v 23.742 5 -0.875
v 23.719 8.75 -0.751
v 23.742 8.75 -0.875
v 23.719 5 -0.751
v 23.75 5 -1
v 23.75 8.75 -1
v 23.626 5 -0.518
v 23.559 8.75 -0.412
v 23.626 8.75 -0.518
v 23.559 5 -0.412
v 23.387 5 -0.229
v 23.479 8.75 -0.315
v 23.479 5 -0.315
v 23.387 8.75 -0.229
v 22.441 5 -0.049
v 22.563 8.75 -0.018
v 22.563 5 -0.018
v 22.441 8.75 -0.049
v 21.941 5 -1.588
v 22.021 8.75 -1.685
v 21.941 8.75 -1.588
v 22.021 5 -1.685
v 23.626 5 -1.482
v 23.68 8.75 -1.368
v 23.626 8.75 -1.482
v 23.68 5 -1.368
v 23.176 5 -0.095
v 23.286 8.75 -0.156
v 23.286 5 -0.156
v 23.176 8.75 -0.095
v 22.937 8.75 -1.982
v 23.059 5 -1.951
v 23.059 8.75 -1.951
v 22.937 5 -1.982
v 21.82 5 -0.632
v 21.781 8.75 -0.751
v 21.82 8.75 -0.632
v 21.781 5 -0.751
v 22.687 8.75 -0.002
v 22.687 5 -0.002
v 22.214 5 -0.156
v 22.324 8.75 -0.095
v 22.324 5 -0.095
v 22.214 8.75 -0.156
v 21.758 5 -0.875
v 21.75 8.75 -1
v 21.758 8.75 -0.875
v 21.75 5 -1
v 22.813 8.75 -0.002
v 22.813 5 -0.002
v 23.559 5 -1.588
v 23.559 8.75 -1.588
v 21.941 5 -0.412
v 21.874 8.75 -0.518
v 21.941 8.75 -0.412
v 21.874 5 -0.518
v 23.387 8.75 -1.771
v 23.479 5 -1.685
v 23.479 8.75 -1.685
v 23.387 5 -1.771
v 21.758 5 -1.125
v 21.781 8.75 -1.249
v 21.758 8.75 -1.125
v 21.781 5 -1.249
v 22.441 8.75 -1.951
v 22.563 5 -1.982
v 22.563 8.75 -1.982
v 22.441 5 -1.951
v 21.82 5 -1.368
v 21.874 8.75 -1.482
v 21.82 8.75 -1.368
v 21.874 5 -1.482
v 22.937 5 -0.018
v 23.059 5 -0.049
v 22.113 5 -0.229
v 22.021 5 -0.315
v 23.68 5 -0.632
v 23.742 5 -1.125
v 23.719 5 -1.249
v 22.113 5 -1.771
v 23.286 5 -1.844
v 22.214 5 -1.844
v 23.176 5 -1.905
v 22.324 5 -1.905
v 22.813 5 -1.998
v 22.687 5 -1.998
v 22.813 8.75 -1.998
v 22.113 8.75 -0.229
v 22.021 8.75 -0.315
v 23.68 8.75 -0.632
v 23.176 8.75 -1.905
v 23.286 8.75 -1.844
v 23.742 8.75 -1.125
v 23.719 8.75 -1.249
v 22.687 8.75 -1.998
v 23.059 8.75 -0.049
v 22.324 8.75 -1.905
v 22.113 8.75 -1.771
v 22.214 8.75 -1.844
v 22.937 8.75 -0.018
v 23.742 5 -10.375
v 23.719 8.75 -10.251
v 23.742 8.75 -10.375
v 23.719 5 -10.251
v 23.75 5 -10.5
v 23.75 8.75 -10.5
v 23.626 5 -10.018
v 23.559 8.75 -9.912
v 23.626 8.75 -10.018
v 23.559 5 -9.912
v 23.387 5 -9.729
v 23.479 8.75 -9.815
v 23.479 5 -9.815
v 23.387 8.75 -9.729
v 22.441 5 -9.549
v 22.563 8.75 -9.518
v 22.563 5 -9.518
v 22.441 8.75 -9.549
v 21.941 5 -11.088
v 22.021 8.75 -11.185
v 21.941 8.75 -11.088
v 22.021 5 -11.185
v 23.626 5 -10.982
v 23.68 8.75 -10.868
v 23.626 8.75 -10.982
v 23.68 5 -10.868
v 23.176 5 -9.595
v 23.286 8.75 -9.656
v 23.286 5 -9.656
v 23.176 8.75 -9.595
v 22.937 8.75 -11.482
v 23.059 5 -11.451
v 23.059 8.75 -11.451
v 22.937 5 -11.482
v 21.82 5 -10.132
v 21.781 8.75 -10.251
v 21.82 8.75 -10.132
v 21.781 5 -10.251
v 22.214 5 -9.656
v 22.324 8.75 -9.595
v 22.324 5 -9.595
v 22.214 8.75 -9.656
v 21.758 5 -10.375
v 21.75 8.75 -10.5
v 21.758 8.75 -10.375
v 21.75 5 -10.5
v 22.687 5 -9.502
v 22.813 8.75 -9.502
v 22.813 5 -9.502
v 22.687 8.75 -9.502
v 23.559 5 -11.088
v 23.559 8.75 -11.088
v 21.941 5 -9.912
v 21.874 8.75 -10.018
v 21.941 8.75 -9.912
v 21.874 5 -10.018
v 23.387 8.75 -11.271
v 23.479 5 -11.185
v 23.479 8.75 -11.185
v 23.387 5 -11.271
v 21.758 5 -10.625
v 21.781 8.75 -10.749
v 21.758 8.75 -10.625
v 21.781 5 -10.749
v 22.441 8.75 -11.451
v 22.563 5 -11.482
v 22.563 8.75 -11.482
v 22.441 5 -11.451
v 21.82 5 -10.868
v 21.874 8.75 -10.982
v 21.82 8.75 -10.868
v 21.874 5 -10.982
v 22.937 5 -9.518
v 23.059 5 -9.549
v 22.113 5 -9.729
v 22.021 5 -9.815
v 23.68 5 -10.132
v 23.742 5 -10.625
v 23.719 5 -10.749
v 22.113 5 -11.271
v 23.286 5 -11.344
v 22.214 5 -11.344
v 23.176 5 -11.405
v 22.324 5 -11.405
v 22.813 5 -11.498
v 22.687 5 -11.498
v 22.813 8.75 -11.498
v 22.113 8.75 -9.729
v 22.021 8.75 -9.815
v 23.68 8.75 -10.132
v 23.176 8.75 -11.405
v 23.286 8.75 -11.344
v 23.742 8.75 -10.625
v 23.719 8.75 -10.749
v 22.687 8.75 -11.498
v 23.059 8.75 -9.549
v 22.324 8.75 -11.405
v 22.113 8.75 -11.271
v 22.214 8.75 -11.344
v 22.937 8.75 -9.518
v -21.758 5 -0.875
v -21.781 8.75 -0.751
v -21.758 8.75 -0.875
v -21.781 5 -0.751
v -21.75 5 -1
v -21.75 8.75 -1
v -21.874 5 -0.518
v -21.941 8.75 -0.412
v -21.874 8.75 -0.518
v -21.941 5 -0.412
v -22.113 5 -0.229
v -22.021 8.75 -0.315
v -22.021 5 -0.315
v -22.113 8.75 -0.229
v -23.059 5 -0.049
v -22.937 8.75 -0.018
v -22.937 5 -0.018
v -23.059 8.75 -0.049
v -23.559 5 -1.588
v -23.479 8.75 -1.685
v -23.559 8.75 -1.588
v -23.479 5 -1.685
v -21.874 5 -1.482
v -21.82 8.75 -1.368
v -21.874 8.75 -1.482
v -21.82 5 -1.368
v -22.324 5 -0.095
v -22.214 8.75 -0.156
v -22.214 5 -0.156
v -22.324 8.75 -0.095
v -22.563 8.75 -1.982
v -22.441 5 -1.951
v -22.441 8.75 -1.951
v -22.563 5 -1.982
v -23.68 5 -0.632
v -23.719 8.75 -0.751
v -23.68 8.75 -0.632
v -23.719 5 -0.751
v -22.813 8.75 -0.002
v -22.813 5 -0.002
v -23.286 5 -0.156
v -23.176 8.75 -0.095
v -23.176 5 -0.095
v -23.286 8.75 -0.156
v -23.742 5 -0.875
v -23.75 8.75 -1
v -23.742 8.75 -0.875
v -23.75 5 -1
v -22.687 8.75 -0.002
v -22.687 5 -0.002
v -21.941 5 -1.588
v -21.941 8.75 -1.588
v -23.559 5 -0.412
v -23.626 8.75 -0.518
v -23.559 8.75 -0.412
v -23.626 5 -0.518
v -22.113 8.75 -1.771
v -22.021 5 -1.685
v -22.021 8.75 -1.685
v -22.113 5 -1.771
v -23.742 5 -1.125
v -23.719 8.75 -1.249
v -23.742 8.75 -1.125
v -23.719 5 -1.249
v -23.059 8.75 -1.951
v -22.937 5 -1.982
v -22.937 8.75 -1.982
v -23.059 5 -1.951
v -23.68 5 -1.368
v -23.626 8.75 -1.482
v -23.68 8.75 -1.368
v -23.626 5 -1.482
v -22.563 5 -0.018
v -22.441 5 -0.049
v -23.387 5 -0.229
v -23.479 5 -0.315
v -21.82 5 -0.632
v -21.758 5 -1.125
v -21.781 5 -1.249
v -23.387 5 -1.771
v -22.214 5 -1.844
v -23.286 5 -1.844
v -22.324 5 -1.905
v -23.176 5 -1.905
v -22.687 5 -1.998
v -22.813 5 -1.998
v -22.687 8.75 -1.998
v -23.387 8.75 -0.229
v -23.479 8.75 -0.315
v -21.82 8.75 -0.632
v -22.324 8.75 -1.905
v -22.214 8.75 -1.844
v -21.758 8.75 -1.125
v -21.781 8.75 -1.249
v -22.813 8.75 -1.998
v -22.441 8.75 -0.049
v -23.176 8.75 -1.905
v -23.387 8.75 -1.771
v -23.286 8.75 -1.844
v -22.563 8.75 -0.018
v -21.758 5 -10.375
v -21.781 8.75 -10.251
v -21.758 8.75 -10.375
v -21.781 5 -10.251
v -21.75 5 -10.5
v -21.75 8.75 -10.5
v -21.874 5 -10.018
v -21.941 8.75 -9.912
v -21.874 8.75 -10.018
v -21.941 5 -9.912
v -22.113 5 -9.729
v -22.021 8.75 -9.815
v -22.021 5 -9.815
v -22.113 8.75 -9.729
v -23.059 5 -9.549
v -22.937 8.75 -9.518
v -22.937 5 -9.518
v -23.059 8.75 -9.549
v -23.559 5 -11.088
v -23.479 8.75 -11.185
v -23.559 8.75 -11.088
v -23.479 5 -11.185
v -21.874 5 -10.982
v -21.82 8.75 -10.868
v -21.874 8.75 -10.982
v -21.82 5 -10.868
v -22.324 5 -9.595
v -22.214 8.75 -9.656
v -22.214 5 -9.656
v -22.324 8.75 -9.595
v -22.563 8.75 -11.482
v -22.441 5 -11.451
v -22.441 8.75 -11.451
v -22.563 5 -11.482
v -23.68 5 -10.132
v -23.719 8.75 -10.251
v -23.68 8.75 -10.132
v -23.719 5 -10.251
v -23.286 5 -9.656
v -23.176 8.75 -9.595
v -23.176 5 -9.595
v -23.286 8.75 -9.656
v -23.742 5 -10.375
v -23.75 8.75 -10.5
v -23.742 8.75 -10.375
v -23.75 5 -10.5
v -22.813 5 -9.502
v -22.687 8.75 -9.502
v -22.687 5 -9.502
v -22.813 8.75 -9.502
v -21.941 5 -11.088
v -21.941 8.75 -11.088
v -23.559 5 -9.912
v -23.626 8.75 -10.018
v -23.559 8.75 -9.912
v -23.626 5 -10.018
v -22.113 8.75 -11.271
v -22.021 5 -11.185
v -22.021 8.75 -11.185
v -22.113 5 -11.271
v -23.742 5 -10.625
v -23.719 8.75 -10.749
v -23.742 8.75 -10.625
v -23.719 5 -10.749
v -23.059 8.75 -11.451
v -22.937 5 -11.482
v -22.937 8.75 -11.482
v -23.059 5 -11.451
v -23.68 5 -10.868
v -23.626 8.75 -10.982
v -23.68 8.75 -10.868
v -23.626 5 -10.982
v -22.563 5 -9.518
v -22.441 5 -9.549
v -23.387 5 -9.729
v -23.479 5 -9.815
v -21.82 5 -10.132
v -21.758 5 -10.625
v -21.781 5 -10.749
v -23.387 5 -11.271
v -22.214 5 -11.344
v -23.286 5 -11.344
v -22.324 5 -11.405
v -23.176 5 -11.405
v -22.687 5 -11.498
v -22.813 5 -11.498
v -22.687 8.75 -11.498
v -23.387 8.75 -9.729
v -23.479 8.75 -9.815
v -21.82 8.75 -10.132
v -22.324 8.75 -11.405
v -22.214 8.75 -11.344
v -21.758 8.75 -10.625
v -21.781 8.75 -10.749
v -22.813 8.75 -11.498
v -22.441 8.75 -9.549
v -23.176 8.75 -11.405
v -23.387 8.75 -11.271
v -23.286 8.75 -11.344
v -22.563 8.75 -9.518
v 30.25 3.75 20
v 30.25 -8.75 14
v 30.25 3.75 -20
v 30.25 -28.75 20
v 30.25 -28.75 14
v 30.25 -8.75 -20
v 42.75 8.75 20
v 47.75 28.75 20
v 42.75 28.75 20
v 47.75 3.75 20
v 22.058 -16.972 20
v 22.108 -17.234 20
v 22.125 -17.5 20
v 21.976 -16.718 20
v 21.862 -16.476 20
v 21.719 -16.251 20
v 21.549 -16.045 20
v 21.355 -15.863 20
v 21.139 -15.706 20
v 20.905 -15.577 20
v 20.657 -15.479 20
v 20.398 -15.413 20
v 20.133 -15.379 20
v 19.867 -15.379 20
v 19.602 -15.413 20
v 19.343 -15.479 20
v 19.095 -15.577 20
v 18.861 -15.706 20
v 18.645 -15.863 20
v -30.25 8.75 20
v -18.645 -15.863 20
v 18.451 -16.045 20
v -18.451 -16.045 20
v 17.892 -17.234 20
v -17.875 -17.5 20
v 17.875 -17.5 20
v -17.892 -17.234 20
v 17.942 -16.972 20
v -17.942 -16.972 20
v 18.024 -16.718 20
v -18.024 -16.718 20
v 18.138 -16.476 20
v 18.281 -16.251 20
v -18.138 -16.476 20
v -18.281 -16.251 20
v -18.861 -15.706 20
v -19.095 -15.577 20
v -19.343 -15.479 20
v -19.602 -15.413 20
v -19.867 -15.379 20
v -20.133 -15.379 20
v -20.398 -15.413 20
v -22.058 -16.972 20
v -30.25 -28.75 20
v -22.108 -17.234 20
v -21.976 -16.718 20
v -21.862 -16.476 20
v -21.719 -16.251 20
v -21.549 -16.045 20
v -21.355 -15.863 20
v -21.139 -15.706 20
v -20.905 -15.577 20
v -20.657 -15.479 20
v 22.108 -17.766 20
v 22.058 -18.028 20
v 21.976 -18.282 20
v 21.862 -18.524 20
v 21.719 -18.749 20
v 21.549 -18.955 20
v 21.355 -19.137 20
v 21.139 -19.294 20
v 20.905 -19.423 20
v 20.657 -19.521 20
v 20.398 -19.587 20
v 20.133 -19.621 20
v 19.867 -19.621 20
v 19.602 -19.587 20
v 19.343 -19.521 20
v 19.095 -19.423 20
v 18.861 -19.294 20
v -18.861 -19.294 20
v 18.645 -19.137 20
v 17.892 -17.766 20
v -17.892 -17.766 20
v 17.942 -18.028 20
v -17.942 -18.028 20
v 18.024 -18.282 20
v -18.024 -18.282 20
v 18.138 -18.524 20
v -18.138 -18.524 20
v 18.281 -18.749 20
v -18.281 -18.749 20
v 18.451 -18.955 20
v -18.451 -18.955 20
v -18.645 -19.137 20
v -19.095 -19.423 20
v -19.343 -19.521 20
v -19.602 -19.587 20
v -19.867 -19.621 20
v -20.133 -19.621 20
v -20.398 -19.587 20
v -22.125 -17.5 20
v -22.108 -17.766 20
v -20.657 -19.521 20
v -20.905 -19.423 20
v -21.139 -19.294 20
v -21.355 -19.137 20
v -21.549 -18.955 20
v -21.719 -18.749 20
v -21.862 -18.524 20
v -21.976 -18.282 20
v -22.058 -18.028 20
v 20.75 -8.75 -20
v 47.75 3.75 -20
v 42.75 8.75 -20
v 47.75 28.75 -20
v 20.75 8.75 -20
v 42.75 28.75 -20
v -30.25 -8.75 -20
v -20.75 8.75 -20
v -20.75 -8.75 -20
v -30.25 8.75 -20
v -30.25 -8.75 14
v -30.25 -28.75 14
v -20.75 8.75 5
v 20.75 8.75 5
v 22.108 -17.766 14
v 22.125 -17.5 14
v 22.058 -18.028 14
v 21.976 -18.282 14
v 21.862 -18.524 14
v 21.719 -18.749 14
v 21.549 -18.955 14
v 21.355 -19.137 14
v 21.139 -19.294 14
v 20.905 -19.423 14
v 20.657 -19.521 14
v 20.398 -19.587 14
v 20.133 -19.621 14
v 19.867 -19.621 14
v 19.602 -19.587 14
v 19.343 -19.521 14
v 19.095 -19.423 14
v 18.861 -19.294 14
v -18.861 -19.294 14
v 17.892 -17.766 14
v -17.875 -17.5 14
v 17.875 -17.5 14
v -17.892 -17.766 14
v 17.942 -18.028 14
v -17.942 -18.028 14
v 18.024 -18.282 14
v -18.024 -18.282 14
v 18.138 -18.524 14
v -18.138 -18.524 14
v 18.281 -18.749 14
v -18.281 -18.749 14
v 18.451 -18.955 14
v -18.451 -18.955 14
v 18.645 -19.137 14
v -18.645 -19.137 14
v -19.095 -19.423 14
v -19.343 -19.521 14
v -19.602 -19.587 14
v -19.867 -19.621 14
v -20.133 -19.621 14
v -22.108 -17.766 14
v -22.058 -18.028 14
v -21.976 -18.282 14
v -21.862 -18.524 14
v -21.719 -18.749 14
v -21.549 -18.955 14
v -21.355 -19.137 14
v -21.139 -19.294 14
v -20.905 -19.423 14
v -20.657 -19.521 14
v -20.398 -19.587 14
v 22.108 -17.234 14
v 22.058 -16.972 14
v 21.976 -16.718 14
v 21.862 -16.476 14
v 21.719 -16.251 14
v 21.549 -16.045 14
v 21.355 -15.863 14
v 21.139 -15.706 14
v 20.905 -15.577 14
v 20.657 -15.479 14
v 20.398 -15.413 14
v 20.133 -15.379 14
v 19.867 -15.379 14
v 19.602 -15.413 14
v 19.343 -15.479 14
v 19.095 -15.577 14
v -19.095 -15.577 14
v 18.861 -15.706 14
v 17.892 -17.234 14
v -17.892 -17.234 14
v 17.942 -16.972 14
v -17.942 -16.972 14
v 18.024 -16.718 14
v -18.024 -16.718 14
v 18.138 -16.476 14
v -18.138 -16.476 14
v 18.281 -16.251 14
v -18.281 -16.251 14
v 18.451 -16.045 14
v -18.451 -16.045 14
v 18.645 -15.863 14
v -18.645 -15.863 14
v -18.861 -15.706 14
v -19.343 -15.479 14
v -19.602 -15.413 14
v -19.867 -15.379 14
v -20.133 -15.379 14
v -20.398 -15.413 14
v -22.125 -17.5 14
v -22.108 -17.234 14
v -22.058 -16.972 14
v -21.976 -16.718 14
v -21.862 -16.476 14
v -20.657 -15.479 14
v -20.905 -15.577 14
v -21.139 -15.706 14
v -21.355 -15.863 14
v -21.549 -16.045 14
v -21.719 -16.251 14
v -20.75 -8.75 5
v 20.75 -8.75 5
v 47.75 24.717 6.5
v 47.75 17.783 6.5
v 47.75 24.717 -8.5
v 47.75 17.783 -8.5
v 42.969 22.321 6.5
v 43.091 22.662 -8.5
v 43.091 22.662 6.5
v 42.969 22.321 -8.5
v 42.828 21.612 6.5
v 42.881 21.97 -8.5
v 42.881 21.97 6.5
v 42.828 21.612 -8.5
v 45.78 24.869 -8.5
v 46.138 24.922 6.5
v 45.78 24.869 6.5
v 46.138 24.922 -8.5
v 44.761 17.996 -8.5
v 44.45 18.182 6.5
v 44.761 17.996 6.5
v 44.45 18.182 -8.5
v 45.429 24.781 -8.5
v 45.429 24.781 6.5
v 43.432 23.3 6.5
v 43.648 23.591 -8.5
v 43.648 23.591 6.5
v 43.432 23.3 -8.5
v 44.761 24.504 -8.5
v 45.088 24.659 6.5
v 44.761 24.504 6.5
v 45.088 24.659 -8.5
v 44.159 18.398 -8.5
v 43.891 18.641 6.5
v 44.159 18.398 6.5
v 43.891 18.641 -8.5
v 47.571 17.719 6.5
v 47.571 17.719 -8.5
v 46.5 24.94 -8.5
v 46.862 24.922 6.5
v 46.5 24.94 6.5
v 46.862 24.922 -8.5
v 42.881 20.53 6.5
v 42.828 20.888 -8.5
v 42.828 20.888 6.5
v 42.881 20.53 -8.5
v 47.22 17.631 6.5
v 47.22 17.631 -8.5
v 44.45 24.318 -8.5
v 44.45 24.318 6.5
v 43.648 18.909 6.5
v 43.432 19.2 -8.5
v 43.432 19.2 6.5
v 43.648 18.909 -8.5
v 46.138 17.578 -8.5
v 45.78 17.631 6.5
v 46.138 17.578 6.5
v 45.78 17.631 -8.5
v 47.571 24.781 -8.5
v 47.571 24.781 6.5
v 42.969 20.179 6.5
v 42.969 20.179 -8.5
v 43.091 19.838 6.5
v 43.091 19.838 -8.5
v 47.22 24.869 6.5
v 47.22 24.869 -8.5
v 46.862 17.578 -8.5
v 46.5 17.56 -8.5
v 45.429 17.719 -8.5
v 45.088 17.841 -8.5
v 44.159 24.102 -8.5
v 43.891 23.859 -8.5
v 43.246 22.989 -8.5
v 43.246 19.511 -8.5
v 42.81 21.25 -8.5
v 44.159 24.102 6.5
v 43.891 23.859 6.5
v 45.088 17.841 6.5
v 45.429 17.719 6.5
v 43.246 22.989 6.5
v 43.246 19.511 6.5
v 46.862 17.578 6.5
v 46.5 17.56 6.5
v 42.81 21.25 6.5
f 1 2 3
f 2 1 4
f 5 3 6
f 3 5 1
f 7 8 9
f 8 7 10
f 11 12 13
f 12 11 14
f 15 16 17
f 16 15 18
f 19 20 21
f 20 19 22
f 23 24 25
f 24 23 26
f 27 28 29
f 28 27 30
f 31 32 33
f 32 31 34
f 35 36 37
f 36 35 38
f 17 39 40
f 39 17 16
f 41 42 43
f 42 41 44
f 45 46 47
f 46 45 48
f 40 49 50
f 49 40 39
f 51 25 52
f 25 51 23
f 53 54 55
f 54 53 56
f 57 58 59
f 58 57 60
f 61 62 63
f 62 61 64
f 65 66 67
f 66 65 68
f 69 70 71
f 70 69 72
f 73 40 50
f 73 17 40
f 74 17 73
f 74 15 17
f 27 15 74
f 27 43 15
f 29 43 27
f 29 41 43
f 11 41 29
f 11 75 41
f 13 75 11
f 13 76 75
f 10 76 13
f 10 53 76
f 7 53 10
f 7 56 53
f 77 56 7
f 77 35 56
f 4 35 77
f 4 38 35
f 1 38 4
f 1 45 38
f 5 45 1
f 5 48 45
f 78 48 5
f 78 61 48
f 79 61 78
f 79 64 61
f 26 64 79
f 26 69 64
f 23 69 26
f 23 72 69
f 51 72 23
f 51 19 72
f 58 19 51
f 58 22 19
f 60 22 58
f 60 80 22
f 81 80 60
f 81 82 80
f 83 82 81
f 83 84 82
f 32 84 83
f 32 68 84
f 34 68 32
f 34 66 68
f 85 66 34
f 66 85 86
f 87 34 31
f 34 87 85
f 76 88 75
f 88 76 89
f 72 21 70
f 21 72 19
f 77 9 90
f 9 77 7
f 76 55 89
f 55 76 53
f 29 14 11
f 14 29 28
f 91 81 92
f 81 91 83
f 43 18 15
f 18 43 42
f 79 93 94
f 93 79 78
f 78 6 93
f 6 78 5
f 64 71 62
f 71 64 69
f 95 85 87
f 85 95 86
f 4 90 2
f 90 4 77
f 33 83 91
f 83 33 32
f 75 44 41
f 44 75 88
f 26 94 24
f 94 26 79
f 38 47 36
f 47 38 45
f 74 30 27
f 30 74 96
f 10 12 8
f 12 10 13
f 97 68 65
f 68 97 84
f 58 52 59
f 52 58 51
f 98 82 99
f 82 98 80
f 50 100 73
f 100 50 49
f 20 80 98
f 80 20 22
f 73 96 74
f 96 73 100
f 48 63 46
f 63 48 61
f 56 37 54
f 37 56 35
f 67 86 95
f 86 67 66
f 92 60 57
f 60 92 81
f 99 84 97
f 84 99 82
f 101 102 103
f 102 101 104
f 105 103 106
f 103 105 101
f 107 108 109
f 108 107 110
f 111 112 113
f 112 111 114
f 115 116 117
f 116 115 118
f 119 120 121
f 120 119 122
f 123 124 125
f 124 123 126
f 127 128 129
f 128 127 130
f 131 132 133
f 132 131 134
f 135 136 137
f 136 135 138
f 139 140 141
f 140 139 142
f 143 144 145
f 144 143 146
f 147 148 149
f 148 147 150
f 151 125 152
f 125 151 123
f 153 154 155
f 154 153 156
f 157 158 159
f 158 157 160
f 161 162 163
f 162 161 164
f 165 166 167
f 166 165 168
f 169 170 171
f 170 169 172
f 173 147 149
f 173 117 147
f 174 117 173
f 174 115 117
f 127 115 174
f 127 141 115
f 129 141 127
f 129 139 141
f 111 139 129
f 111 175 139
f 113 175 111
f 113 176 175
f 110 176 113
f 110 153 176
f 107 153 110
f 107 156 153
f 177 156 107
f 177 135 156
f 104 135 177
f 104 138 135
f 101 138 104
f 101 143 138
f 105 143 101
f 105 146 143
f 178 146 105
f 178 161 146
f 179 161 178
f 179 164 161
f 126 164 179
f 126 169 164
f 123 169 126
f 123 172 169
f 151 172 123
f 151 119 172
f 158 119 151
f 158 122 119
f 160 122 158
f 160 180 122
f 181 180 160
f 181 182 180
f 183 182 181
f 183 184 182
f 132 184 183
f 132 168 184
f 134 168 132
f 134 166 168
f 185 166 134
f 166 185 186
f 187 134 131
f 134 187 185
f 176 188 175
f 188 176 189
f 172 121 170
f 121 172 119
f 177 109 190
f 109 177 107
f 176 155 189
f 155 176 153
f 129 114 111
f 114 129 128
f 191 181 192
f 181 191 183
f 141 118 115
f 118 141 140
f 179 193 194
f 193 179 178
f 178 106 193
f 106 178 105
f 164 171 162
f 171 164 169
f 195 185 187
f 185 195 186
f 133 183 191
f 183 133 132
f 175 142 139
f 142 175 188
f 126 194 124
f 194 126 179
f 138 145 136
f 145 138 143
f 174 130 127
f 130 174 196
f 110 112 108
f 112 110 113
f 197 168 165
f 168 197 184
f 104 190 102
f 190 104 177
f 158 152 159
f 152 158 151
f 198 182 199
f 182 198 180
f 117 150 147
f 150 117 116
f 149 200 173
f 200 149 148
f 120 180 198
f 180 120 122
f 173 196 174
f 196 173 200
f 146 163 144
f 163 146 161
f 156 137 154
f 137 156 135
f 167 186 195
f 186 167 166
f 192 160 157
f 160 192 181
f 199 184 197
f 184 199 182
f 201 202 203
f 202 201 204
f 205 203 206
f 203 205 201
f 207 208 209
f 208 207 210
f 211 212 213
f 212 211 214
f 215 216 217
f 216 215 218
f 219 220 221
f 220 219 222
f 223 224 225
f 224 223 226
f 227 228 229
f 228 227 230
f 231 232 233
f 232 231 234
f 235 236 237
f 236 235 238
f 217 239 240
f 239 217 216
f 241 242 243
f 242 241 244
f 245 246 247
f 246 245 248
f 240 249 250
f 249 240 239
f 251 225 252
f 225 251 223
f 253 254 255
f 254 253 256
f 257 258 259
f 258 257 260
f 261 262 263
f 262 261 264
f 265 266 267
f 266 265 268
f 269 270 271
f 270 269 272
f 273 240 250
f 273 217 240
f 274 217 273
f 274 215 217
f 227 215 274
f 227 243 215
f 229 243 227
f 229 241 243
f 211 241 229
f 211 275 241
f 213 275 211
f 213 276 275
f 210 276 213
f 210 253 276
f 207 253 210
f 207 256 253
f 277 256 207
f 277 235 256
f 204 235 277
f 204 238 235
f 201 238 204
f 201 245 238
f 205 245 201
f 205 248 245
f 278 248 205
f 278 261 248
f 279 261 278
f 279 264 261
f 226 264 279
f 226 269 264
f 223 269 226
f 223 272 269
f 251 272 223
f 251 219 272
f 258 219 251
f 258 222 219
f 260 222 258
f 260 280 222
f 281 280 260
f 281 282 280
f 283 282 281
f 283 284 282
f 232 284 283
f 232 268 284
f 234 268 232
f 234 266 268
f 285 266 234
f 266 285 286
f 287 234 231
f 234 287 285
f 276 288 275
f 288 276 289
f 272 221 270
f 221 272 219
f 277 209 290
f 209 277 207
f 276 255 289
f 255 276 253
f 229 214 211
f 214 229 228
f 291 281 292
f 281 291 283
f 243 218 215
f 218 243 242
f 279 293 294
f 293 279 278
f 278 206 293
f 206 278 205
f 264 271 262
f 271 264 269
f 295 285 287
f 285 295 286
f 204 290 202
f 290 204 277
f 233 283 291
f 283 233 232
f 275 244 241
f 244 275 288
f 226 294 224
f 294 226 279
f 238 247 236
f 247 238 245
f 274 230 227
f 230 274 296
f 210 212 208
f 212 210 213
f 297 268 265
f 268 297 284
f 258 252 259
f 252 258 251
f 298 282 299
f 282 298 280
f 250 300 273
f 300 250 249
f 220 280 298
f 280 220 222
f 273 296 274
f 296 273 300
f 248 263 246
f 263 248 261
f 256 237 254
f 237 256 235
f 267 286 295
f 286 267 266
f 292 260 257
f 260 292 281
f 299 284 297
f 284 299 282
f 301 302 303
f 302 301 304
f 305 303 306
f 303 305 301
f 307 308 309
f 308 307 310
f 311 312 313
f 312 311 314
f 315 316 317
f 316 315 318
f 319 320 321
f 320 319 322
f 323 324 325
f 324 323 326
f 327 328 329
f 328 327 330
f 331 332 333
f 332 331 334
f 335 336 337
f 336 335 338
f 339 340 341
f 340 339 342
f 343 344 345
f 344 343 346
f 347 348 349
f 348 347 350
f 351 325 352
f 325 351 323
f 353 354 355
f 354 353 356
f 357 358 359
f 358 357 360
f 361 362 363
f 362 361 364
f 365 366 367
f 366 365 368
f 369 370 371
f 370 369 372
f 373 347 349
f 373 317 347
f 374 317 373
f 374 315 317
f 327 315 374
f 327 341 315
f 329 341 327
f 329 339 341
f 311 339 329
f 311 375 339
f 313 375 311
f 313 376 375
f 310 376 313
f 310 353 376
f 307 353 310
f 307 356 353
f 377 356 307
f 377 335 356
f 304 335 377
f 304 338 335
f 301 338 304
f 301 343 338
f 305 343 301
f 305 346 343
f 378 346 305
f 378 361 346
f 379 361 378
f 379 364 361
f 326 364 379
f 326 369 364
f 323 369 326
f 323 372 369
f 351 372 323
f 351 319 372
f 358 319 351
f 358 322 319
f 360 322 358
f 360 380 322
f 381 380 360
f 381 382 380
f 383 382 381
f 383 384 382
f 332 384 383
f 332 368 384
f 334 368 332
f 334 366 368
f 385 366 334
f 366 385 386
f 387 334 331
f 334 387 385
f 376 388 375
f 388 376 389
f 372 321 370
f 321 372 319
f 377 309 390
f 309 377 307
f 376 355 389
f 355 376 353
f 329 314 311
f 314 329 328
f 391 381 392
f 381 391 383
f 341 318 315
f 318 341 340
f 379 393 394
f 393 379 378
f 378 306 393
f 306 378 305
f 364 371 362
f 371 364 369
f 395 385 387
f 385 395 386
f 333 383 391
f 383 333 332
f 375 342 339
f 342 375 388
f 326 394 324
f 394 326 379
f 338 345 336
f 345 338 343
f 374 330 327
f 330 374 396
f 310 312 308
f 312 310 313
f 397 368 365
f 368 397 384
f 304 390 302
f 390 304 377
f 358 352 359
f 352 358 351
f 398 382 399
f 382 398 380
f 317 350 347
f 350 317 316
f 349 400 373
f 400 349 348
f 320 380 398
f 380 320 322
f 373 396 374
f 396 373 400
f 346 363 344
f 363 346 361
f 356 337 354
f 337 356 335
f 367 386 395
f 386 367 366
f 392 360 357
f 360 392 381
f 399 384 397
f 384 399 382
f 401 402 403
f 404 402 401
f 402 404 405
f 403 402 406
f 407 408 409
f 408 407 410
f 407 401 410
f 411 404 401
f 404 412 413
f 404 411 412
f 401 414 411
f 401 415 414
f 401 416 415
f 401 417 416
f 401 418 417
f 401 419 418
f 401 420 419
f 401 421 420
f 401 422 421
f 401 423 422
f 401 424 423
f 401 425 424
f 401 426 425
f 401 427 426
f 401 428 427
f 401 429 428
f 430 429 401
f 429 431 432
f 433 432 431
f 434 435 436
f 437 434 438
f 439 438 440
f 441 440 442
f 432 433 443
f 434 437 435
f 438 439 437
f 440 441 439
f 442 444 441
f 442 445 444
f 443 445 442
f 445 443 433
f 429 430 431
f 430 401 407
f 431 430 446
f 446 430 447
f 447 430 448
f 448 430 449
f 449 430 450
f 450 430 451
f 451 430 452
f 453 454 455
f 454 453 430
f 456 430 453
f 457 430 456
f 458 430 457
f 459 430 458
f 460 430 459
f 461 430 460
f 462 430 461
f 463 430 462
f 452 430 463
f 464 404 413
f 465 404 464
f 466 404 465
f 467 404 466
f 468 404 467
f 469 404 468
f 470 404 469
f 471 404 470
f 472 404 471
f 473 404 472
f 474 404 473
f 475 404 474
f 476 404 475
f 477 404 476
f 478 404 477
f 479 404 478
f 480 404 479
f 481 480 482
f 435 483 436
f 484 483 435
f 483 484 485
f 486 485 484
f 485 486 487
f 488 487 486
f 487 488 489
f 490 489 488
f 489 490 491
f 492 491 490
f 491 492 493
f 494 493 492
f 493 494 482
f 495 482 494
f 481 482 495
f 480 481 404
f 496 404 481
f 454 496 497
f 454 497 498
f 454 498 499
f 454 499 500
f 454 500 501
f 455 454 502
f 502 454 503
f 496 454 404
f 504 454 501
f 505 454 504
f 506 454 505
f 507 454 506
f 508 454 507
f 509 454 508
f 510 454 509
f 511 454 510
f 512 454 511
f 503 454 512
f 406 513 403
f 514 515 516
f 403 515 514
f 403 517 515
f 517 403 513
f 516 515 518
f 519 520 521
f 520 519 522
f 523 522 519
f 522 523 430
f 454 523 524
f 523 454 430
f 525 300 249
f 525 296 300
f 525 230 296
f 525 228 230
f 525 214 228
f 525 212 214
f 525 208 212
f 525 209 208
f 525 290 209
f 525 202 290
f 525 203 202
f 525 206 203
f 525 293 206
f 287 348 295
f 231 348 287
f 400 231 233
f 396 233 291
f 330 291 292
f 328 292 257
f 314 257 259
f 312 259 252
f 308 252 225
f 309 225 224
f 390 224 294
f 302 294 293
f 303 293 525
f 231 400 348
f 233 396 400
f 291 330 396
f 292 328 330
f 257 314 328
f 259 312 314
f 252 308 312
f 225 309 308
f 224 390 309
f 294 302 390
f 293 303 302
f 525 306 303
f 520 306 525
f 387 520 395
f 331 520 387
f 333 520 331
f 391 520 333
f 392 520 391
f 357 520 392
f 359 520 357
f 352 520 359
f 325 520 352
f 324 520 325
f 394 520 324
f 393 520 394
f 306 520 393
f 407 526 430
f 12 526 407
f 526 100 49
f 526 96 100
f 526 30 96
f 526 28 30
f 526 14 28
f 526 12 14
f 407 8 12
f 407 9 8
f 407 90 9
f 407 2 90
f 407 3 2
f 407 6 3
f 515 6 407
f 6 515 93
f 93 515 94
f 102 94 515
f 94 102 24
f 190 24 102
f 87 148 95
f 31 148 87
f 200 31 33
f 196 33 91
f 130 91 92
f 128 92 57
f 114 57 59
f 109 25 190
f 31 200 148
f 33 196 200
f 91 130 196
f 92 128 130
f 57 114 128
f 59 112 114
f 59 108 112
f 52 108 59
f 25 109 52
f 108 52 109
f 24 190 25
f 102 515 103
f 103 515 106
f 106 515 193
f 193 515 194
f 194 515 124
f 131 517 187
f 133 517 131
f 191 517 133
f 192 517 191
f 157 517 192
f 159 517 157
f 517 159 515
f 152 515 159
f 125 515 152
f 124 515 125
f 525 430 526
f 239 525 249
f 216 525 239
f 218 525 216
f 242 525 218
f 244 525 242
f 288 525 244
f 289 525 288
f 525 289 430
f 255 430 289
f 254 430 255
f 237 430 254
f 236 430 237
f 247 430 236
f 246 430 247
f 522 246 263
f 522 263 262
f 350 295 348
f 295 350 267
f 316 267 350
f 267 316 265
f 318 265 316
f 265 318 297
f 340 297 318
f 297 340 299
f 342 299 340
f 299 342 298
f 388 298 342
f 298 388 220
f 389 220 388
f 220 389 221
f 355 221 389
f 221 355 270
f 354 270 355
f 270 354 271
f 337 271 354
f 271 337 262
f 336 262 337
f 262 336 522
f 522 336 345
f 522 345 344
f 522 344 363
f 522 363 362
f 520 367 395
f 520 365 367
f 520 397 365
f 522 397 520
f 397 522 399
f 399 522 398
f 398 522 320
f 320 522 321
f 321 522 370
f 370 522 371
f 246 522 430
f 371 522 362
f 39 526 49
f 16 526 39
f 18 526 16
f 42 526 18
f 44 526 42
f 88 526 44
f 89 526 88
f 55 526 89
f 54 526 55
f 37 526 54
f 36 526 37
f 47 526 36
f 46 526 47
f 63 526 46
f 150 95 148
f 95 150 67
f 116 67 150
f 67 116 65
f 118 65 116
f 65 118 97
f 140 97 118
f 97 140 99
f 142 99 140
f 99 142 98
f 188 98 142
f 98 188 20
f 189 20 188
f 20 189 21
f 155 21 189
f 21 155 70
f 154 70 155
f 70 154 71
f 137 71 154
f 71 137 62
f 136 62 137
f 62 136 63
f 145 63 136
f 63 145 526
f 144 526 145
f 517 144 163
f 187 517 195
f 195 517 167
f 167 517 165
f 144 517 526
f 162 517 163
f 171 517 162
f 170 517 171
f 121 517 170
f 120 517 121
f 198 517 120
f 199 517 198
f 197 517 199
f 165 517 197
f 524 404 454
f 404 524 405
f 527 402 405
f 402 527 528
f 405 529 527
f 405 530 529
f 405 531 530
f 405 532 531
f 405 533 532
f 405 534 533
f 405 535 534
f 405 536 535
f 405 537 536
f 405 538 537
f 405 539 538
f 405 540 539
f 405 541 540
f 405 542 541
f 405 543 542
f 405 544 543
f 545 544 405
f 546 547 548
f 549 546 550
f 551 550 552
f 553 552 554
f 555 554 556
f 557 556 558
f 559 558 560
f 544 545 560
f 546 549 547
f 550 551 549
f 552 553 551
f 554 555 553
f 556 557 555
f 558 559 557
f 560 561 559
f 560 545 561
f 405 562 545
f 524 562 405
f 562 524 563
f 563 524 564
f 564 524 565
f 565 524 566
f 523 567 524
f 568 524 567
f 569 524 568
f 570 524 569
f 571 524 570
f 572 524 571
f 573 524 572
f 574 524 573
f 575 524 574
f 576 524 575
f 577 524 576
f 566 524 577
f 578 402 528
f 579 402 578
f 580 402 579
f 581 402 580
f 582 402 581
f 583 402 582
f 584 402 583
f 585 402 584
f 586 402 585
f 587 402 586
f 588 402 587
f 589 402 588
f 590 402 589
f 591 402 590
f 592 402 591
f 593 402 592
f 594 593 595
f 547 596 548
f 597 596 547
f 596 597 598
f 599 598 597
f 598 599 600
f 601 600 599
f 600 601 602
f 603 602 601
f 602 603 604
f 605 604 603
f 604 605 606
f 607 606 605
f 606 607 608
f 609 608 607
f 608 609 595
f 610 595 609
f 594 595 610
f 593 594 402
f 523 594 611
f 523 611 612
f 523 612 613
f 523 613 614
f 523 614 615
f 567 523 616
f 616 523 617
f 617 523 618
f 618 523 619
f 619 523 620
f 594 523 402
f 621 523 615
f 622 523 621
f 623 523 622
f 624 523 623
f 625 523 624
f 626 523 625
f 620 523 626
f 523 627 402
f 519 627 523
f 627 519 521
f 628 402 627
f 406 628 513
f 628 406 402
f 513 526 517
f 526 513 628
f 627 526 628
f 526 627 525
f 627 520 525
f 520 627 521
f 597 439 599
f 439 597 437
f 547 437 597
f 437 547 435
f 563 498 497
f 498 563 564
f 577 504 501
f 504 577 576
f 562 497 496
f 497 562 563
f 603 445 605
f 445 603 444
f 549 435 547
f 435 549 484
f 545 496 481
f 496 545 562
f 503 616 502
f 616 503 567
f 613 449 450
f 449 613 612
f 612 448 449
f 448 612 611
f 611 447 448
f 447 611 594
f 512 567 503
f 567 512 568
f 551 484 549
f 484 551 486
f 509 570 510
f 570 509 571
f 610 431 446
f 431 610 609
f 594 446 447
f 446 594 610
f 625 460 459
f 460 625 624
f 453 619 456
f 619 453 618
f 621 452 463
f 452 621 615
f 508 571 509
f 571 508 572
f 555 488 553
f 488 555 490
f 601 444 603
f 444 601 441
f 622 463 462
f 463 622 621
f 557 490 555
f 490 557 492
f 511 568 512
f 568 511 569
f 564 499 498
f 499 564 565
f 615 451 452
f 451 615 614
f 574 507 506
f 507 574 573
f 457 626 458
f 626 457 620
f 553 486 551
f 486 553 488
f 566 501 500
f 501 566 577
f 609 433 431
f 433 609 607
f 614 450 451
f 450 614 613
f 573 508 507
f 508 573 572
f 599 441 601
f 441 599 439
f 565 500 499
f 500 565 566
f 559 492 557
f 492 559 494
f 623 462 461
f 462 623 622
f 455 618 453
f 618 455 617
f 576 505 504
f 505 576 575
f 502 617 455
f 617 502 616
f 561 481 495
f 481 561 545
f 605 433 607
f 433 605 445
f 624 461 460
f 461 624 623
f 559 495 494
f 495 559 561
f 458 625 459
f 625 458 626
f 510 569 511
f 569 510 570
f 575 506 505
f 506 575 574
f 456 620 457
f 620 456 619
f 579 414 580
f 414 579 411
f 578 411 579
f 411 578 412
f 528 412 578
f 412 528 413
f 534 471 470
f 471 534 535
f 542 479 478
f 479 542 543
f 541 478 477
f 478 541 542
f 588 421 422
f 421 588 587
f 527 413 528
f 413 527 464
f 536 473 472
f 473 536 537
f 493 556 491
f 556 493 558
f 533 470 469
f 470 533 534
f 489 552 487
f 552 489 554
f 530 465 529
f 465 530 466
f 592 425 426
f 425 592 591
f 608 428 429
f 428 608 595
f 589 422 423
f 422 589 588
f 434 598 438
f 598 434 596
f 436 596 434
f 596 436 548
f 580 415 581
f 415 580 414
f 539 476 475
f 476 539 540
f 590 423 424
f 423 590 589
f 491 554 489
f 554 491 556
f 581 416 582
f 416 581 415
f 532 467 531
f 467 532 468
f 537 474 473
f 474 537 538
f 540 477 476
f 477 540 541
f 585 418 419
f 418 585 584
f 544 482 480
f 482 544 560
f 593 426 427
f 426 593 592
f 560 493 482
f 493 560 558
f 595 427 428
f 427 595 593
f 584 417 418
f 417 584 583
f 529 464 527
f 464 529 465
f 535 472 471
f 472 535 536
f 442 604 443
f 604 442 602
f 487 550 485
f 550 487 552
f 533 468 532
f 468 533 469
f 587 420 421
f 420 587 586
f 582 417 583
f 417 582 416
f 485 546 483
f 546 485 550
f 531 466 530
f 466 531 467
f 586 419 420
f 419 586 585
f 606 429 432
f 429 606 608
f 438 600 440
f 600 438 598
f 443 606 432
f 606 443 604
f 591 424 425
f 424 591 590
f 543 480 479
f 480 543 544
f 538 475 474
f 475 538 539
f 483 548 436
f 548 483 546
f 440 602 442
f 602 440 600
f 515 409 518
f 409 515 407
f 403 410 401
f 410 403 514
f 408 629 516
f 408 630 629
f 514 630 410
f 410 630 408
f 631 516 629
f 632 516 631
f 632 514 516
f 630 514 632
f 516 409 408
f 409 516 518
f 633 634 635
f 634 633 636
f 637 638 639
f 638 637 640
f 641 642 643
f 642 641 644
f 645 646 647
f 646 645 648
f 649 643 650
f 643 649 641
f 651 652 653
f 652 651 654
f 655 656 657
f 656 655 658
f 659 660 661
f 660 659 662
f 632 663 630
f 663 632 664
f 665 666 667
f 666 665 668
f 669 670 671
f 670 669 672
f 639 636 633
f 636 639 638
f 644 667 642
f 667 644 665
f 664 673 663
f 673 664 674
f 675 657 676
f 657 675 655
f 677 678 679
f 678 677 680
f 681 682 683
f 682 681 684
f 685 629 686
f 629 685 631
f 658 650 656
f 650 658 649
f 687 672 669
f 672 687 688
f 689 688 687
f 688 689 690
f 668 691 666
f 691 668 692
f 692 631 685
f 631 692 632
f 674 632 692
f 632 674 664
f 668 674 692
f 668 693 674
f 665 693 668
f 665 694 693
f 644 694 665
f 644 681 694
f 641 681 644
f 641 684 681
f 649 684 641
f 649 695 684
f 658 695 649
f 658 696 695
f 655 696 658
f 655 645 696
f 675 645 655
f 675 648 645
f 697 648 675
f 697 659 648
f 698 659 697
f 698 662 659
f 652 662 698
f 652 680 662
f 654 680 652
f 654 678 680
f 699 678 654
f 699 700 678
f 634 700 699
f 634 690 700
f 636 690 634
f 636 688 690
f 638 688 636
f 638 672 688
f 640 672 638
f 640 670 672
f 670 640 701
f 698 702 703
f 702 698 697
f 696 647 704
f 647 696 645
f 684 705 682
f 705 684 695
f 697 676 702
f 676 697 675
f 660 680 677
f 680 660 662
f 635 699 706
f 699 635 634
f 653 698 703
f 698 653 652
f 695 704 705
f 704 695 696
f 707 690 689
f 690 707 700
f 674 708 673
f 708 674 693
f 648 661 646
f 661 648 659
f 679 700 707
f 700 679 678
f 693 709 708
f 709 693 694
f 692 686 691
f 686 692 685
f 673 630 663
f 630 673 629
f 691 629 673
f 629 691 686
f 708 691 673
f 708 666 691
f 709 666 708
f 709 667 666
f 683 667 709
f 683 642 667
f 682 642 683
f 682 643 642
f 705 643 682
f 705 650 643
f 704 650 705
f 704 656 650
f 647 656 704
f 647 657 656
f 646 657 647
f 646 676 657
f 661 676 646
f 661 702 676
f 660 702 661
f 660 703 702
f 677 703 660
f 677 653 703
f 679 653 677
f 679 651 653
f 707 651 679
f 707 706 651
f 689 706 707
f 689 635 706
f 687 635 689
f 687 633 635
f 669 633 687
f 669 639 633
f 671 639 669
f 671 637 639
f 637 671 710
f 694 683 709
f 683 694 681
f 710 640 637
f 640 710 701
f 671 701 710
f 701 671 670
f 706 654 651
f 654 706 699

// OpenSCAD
// file: BOSL2/threading.scad
// Minimal thread approximations for bundled gallery models.
// These preserve dimensions for preview/export without generating helical thread detail.

CENTER = [0, 0, 0];

module screw_thread(d=10, l=10, pitch=1, internal=false, anchor=CENTER) {
    center = anchor == CENTER;
    translate(center ? [0, 0, 0] : [0, 0, l / 2])
        cylinder(d=d, h=l, center=true);
}

module threaded_rod(d=10, l=10, pitch=1, internal=false, anchor=CENTER) {
    screw_thread(d=d, l=l, pitch=pitch, internal=internal, anchor=anchor);
}
// file: BOSL2/std.scad
// Minimal BOSL2 compatibility shim for bundled gallery models.
// It implements only the helpers used by the imported OpenSCAD projects.

CENTER = [0, 0, 0];
BOTTOM = [0, 0, -1];
TOP = [0, 0, 1];
LEFT = [-1, 0, 0];
RIGHT = [1, 0, 0];
FRONT = [0, -1, 0];
BACK = [0, 1, 0];

module up(z=0) {
    translate([0, 0, z]) children();
}

module down(z=0) {
    translate([0, 0, -z]) children();
}

module attach(anchor=CENTER) {
    children();
}

module cuboid(size=[1, 1, 1], anchor=CENTER) {
    center = anchor == CENTER;
    translate(center ? [0, 0, 0] : [0, 0, size[2] / 2])
        cube(size, center=true);
    children();
}

module xcyl(h=1, r=1, anchor=CENTER) {
    center = anchor == CENTER;
    translate(center ? [0, 0, 0] : [h / 2, 0, 0])
        rotate([0, 90, 0])
            cylinder(h=h, r=r, center=true);
}
// main file
include <BOSL2/std.scad>
include <BOSL2/threading.scad>

$fn = 64;

d_sruby = 6.73+0.5;     // zmierzona średnica zewnętrzna śruby
pitch   = 1;     // skok gwintu

// luz
luz = 0.15;

//serwo
ser_x = 40.5;
ser_y = 40;
ser_h = 39.2;

//uchwyt

od_gory = 15;
u_x = ser_x+20;
u_y = 17.5;
u_z = 40;
grubosc = 6;

sr_deska = 4.25;
sr_serwo = 2;

linka_odl = 12.5;
linka_h = 25;


module wkret(sr){
    cylinder(d=sr, h=20, center = true, $fn = 50);
}

union(){
difference(){
    translate([0,-10,0]){
    cube([u_x,u_y+20,u_z], center = true);
    }
    translate([0,-u_y-5/2,-grubosc]){
        cube([u_x,u_y+5,u_z], center = true);
    }
    
        translate([0,u_y/2,u_z/2-ser_y/2-od_gory]){
        cube([ser_x+1,ser_h,ser_y], center = true);
    }
    
    translate([-20,-17.5,u_z/2]){
    wkret(sr_deska);
    }
    
        translate([20,-17.5,u_z/2]){
    wkret(sr_deska);
    }
    
    translate([(ser_x+1)/2+2,15,-1]){
        rotate([90,0,0]){
    wkret(sr_serwo);
            
       translate([0,-5-4.5,0]){
        wkret(sr_serwo);
           }
    }}
    
        translate([-(ser_x+1)/2-2,15,-1]){
        rotate([90,0,0]){
    wkret(sr_serwo);
            
       translate([0,-5-4.5,0]){
        wkret(sr_serwo);
           }
    }}
}
    difference(){
    translate([u_x/2+linka_odl/2,u_y/2-5/2,0]){
    cube([linka_odl,5,u_z], center = true);
    translate([linka_odl/2+2.5,linka_h/2-2.5,0]){
        cube([5,linka_h,u_z], center = true);}
    }
    translate([u_x/2+linka_odl/2+10,u_y/2-5/2+15,-1]){
    #threaded_rod(d=d_sruby+luz, l=15, pitch=pitch, orient = RIGHT);}
}
}
